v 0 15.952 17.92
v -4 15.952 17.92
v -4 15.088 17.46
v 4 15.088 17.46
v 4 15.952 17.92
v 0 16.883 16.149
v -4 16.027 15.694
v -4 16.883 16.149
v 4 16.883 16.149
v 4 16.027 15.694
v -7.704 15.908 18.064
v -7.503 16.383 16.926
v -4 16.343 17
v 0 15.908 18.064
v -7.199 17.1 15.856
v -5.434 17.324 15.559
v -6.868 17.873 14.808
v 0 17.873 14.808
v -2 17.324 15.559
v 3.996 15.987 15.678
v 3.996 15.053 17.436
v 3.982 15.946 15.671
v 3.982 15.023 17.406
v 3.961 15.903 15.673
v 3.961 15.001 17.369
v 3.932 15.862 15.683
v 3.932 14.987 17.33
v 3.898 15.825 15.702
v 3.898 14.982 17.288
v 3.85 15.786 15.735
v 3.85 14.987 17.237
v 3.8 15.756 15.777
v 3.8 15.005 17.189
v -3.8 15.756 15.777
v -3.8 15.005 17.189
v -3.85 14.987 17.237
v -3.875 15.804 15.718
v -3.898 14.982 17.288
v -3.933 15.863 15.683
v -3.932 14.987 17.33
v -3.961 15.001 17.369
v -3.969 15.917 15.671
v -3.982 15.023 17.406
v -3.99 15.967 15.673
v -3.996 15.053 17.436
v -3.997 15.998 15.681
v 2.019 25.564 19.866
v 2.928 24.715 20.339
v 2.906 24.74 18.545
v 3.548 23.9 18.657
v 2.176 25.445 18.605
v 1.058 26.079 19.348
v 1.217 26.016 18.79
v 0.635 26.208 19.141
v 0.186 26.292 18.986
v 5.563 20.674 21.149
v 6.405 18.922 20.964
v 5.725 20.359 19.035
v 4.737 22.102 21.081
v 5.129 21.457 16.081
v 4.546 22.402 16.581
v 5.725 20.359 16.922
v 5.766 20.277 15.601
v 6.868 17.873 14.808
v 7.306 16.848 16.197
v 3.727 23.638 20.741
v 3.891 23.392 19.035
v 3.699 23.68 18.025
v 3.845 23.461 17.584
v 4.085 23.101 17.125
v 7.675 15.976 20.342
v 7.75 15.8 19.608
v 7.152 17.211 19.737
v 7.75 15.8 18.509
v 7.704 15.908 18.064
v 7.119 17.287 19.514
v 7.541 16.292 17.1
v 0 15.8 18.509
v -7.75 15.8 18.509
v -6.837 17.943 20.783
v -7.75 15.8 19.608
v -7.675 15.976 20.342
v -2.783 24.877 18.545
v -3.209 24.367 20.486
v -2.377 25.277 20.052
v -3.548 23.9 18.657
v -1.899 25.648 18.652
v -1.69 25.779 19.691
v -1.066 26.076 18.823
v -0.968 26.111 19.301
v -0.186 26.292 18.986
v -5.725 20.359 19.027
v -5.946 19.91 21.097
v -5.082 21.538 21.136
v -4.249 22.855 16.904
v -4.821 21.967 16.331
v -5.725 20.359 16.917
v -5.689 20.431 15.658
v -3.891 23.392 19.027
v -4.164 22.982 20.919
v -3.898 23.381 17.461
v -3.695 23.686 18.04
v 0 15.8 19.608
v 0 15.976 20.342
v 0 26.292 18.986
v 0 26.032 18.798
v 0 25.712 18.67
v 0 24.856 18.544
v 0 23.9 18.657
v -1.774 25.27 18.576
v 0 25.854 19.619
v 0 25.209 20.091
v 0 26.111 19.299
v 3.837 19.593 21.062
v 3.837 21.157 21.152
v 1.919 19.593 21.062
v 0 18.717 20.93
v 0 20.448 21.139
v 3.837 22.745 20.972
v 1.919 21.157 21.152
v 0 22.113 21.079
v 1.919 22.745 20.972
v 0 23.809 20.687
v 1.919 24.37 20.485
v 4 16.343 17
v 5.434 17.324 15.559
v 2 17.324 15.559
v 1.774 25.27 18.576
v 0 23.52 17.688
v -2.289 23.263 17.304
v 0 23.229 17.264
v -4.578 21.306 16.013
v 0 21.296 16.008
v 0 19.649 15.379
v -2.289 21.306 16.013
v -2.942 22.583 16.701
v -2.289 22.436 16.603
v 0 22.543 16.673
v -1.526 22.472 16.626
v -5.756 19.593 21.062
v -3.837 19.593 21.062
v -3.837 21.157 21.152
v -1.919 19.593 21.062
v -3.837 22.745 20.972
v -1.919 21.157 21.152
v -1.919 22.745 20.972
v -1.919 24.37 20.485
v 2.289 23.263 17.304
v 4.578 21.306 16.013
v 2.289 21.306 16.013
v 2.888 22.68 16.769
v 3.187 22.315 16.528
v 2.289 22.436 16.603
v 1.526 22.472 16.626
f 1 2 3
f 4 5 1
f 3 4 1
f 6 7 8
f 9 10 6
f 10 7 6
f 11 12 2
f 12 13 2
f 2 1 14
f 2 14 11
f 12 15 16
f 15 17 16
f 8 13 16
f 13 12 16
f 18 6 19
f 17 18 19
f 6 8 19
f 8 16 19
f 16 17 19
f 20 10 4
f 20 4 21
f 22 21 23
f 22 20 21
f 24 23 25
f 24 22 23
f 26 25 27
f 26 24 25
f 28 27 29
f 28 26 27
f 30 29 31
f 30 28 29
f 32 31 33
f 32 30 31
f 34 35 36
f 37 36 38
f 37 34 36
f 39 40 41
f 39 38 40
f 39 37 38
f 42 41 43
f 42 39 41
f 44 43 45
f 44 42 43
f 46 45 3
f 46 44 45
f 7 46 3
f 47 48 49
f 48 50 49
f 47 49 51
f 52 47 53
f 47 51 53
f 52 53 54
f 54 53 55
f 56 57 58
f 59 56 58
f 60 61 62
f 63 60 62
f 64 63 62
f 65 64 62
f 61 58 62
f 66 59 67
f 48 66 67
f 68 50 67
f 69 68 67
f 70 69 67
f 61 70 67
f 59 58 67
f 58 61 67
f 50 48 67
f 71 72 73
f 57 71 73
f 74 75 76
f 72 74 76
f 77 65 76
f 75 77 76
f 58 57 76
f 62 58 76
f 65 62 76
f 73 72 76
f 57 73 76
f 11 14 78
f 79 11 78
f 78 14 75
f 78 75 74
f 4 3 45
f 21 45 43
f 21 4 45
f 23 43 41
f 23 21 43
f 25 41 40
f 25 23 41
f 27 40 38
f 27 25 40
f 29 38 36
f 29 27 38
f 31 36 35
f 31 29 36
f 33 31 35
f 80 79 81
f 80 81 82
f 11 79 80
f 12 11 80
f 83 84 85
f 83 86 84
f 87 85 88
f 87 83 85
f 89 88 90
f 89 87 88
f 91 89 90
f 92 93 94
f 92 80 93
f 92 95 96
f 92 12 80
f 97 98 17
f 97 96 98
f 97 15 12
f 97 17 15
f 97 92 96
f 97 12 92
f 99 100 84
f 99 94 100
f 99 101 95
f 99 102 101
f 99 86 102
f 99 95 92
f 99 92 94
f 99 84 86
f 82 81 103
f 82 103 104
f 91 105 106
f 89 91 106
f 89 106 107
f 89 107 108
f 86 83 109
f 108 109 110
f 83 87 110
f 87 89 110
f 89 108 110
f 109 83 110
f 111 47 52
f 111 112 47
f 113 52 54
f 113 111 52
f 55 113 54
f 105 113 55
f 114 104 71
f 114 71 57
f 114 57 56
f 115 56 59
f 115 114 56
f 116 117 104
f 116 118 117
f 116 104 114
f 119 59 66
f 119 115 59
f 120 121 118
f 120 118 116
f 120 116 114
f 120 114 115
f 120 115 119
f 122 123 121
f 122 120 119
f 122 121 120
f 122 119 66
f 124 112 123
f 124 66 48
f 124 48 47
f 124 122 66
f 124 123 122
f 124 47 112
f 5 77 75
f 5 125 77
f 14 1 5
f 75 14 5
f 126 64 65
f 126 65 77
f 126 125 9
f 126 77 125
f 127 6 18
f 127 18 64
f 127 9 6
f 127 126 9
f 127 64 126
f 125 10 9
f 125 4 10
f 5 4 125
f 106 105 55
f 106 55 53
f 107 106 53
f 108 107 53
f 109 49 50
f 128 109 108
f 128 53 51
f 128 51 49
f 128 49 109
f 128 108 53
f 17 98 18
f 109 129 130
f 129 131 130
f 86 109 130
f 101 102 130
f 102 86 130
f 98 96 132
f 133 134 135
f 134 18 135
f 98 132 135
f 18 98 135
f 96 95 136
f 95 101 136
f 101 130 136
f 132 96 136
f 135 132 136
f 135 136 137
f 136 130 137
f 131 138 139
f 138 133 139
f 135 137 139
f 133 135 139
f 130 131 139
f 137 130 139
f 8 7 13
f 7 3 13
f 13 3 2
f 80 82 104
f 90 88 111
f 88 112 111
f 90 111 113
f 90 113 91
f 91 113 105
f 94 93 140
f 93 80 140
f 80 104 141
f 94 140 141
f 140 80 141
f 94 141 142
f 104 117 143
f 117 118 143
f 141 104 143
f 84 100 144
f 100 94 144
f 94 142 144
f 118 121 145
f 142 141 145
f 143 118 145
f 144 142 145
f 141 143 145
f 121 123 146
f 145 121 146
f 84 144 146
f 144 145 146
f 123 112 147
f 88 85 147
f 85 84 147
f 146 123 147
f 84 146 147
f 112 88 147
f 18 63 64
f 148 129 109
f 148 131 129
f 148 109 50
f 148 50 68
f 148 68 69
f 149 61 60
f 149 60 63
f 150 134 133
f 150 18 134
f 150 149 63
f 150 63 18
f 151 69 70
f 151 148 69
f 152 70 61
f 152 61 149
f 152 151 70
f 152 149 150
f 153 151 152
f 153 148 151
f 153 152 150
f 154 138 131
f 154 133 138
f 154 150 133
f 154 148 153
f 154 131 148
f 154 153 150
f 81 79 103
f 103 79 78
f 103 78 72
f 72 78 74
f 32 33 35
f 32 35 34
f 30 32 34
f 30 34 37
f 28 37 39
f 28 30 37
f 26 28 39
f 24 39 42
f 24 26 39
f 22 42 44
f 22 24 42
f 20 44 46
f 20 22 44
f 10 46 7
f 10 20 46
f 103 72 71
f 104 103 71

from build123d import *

# Parameters (mm, degrees)
F2_DEPTH = 7.75
F4_DEPTH = 25
F6_DEPTH = 4
F7_R     = 0.2


with BuildPart() as f2:
    # F1 (on Right) → F2 (new body, symmetric)
    with BuildSketch(Plane.YZ):
        with BuildLine():
            add(Edge.make_bspline(
                [(15.9764018067, 20.3420528816), (17.2041890595, 20.6287244677), (19.5850299616, 21.1870373625), (22.6354301881, 21.2058318383), (25.7183894409, 20.0206141081), (26.1510953936, 19.2531516386), (26.2918325878, 18.9858826508)],
                knots=[0, 0, 0, 0, 0.2959604726, 0.569686359, 0.8417277002, 1, 1, 1, 1], degree=3))
            add(Edge.make_bspline(
                [(15.907533388, 18.0637109861), (15.834929305, 18.3091583728), (15.6598763017, 19.138099244), (15.8269500679, 19.8043517568), (15.9764018067, 20.3420528816)],
                knots=[0.583290594, 0.583290594, 0.583290594, 0.583290594, 0.7059883384, 1, 1, 1, 1], degree=3))
            add(Edge.make_bspline(
                [(15.907533388, 18.0637109861), (16.3952708112, 18.2571285426), (17.5152711285, 18.7051624944), (20.8104230334, 19.6077071346), (22.5333760998, 19.128982349), (23.4615845949, 18.8083123925), (23.8998483478, 18.6566487187)],
                knots=[0, 0, 0, 0, 0.2330121711, 0.5559876221, 0.7913389708, 1, 1, 1, 1], degree=3))
            add(Edge.make_bspline(
                [(26.2918325878, 18.9858826508), (26.0522422972, 18.7461785524), (25.2037589138, 18.4974557574), (24.4436755058, 18.5382203481), (23.8998483478, 18.6566487187)],
                knots=[0, 0, 0, 0, 0.4724232135, 1, 1, 1, 1], degree=3))
        make_face()
        with BuildLine():
            add(Edge.make_bspline(
                [(15.907533388, 18.0637109861), (16.3952708112, 18.2571285426), (17.5152711285, 18.7051624944), (20.8104230334, 19.6077071346), (22.5333760998, 19.128982349), (23.4615845949, 18.8083123925), (23.8998483478, 18.6566487187)],
                knots=[0, 0, 0, 0, 0.2330121711, 0.5559876221, 0.7913389708, 1, 1, 1, 1], degree=3))
            add(Edge.make_bspline(
                [(17.872953561, 14.8083452143), (17.2104388475, 15.7501231879), (16.5534544022, 16.4581339927), (16.0339610251, 17.6363061925), (15.907533388, 18.0637109861)],
                knots=[0, 0, 0, 0, 0.3696333829, 0.583290594, 0.583290594, 0.583290594, 0.583290594], degree=3))
            add(Edge.make_bspline(
                [(23.8998483478, 18.6566487187), (23.749402857, 18.1850885688), (23.4105386945, 17.122944171), (21.2445071896, 15.8607875111), (19.0759119851, 15.1838529079), (17.872953561, 14.8083452143)],
                knots=[0, 0, 0, 0, 0.2622875414, 0.5907777464, 1, 1, 1, 1], degree=3))
        make_face()
    extrude(amount=F2_DEPTH, both=True)

    # F3 (on Top) → F4 (intersect)
    with BuildSketch(Plane.XY):
        with BuildLine():
            add(Edge.make_bspline(
                [(-7.75, 15.8), (-7.2858735782, 16.8846031645), (-5.7486243533, 20.6341718163), (-3.9473069374, 23.2912684486), (-2.0830353705, 26.1251607988), (0, 26.3124387711)],
                knots=[0, 0, 0, 0, 0.3533091933, 0.6510969403, 1, 1, 1, 1], degree=3))
            Line((-7.75, 15.8), (7.75, 15.8))
            add(Edge.make_bspline(
                [(7.75, 15.8), (7.2858735782, 16.8846031645), (5.7486243533, 20.6341718163), (3.9473069374, 23.2912684486), (2.0830353705, 26.1251607988), (0, 26.3124387711)],
                knots=[0, 0, 0, 0, 0.3533091933, 0.6510969403, 1, 1, 1, 1], degree=3))
        make_face()
    extrude(amount=F4_DEPTH, mode=Mode.INTERSECT)

    # F5 (on Right) → F6 (join, symmetric)
    with BuildSketch(Plane.YZ):
        Polygon((16.2354782637, 18.0701025299), (14.9110568744, 17.3658951857), (15.85, 15.6), (17.1744213893, 16.3042073442), align=None)
    extrude(amount=F6_DEPTH, both=True)

    # F7
    f7_edges = [f2.edges().sort_by_distance(p)[0] for p in [
        (4, 15.380528, 16.482948),
        (0, 14.911057, 17.365895),
        (-4, 15.380528, 16.482948),
        (0, 15.85, 15.6),
    ]]
    fillet(f7_edges, radius=F7_R)


solid = f2.part
